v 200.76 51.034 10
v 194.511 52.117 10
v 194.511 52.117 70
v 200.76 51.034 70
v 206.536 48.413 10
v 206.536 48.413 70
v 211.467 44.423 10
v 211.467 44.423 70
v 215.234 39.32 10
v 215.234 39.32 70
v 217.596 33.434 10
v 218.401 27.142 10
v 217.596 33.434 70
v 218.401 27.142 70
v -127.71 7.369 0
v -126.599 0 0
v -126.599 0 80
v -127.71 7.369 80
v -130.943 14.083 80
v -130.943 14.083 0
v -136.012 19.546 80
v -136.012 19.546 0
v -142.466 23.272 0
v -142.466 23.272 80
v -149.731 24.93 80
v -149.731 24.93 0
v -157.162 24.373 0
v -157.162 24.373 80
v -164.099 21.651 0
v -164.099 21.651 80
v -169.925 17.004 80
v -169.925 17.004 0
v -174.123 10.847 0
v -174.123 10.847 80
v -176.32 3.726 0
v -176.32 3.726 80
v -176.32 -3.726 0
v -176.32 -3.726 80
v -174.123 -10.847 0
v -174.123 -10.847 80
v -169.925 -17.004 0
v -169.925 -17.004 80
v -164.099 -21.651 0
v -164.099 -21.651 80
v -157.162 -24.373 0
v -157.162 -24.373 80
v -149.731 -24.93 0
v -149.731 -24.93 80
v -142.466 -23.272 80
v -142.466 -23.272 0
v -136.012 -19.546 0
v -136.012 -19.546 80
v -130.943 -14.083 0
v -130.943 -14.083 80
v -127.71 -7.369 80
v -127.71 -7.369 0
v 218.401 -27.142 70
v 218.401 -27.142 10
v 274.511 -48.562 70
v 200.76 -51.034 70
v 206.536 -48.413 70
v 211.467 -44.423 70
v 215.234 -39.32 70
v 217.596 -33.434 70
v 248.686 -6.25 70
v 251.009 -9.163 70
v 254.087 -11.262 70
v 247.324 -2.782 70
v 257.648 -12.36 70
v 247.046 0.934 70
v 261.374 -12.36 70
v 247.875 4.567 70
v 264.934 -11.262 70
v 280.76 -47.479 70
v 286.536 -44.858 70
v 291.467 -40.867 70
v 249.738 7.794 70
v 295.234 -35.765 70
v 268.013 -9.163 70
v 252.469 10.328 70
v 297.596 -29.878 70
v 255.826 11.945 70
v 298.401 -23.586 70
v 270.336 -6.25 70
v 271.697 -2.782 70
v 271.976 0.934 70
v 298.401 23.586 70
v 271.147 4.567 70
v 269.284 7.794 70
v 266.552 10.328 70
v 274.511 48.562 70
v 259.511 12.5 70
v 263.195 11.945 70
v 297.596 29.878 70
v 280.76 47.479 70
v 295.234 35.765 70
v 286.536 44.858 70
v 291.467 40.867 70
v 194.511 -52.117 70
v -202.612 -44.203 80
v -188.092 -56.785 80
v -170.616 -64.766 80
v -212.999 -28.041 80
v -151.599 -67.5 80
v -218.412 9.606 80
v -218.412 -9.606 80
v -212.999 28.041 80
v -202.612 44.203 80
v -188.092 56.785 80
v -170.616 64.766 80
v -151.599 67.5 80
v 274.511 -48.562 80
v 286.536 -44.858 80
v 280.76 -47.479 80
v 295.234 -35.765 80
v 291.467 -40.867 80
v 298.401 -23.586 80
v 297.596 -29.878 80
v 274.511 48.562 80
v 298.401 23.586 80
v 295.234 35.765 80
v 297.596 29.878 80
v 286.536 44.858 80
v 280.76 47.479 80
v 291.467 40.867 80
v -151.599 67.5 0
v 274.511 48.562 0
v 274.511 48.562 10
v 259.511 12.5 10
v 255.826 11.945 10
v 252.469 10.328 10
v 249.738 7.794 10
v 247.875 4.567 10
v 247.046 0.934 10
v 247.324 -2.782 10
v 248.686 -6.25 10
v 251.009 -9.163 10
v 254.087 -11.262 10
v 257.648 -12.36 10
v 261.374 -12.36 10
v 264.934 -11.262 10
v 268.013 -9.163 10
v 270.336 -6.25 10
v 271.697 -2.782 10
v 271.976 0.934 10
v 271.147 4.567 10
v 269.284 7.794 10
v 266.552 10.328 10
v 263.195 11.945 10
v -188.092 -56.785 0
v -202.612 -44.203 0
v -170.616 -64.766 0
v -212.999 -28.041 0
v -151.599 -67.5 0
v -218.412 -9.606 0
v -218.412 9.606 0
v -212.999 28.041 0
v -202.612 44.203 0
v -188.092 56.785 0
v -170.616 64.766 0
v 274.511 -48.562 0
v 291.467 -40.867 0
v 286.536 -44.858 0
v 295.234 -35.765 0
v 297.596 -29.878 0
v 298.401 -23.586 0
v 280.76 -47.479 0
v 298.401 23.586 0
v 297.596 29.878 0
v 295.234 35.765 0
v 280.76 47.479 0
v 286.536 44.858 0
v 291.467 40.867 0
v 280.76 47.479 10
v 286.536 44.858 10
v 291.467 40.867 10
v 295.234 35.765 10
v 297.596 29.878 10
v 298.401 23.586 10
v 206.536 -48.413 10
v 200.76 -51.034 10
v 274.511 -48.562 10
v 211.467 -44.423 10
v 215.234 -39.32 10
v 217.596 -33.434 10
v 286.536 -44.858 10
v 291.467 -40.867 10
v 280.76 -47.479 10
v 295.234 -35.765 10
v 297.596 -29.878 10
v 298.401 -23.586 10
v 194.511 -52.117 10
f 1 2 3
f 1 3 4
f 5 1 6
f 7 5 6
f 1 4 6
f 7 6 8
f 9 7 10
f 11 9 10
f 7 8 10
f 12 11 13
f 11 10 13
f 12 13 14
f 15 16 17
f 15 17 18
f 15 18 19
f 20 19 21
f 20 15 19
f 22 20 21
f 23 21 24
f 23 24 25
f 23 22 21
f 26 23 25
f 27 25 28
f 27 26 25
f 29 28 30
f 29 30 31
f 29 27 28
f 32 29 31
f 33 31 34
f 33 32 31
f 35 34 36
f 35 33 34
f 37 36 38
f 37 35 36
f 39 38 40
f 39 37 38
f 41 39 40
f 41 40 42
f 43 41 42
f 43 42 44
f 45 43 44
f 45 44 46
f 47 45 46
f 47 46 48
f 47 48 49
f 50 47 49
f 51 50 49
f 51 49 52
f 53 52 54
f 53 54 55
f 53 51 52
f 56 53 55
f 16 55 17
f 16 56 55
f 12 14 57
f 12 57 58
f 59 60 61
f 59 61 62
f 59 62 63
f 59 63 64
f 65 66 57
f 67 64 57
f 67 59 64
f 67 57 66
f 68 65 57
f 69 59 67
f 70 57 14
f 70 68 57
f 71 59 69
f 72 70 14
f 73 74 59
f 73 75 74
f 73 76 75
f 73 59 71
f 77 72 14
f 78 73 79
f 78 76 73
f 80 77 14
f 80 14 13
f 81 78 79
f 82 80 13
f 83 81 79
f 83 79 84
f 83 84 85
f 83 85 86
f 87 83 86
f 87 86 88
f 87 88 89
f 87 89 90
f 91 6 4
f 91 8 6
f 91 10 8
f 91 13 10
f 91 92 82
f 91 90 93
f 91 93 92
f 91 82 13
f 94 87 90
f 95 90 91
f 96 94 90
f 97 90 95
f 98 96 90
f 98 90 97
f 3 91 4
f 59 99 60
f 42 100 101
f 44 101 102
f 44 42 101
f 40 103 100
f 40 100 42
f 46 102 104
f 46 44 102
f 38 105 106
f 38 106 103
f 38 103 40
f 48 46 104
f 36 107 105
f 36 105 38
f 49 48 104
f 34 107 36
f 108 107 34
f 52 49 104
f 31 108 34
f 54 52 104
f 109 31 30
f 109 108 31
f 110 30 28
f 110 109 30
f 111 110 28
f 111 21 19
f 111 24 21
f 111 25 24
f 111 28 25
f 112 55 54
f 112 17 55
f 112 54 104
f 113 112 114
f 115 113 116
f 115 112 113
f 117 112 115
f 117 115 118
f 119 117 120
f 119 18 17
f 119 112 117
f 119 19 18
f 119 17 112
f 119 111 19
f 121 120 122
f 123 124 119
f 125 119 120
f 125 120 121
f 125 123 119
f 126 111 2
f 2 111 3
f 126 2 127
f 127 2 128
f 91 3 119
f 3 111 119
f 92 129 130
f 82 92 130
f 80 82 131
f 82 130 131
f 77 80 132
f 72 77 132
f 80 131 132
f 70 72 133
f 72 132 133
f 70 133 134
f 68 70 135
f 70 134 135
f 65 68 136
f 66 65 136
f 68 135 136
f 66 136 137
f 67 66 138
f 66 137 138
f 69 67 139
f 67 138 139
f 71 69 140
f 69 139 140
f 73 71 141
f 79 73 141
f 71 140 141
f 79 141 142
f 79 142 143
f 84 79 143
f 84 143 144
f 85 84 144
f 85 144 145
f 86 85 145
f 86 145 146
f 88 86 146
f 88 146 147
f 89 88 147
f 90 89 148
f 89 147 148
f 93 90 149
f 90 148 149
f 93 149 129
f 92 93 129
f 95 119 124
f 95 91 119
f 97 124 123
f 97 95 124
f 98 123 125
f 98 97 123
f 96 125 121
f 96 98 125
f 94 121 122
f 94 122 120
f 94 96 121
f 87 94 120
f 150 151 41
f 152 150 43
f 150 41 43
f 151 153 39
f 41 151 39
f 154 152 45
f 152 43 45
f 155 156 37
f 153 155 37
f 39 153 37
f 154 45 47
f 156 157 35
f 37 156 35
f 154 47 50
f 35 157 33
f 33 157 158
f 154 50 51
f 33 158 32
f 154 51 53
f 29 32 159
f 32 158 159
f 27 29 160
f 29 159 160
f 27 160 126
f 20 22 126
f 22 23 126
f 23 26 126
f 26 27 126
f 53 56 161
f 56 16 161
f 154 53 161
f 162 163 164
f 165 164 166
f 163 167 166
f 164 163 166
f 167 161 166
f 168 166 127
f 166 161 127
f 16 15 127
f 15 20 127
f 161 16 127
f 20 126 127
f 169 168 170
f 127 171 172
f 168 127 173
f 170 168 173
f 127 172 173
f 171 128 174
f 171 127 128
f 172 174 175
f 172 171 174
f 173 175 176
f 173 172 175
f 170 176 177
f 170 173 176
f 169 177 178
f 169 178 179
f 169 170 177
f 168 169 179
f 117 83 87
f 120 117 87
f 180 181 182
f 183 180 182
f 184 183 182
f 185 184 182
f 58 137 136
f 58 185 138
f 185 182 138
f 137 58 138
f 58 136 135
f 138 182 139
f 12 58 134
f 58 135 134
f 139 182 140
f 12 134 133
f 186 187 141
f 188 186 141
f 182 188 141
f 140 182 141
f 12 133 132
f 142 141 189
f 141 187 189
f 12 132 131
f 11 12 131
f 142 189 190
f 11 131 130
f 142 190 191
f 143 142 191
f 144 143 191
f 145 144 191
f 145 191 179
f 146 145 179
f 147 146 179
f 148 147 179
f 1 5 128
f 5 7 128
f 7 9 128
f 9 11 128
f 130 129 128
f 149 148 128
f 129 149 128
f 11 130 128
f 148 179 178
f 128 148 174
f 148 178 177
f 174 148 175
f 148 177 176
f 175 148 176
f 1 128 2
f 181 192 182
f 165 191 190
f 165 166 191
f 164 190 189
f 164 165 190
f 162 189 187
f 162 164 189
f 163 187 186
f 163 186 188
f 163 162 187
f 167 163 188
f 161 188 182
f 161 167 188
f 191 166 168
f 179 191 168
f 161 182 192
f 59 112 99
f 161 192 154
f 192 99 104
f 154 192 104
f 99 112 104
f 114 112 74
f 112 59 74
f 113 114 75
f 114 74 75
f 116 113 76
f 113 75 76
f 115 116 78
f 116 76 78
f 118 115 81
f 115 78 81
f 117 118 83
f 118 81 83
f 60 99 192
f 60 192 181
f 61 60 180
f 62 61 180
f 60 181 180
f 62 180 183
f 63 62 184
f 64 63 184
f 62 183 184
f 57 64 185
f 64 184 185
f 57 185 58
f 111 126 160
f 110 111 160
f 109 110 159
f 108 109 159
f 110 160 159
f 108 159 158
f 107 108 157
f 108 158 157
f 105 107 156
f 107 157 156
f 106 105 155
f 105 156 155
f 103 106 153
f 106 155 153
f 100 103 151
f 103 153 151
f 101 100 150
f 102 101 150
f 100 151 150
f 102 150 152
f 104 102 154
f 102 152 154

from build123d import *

# Parameters (mm, degrees)
SKETCH1_R           = 25
BOSS_EXTRUDE1_DEPTH = 80
CUT_EXTRUDE1_DEPTH  = 80
SKETCH4_W           = 60
SKETCH4_H           = 145
CUT_EXTRUDE2_DEPTH  = 80
FILLET1_R           = 25
FILLET2_R           = 25
SKETCH5_R           = 12.5
BOSS_EXTRUDE2_DEPTH = 60


with BuildPart() as part:
    # Sketch1 → Boss-Extrude1 (new body)
    with BuildSketch(Plane.XY):
        with BuildLine():
            Line((-151.599161153, -67.5), (298.400838847, -67.5))
            Line((298.400838847, -67.5), (298.400838847, 67.5))
            Line((298.400838847, 67.5), (-151.599161153, 67.5))
            ThreePointArc((-151.599161153, 67.5), (-219.099161153, 0), (-151.599161153, -67.5))
        make_face()
        with Locations((-151.599161153, 0)):
            Circle(SKETCH1_R, mode=Mode.SUBTRACT)
    extrude(amount=BOSS_EXTRUDE1_DEPTH)

    # Sketch3 → Cut-Extrude1 (cut)
    with BuildSketch(Plane.XY.offset(80)):
        Polygon((298.400838847, 67.5), (-151.599161153, 67.5), (298.400838847, 47.5), align=None)
        Polygon((298.400838847, -67.5), (298.400838847, -47.5), (-151.599161153, -67.5), align=None)
    extrude(amount=-CUT_EXTRUDE1_DEPTH, mode=Mode.SUBTRACT)

    # Sketch4 → Cut-Extrude2 (cut)
    with BuildSketch(Plane(origin=(298.400838847, 0, 0), x_dir=(0, 0, -1), z_dir=(1, 0, 0))):
        with Locations((-40, 0)):
            Rectangle(SKETCH4_W, SKETCH4_H)
    extrude(amount=-CUT_EXTRUDE2_DEPTH, mode=Mode.SUBTRACT)

    # Fillet1
    fillet1_edges = [part.edges().sort_by_distance(p)[0] for p in [
        (218.400838847, -51.055555556, 40),
        (218.400838847, 51.055555556, 40),
    ]]
    fillet(fillet1_edges, radius=FILLET1_R)

    # Fillet2
    fillet2_edges = [part.edges().sort_by_distance(p)[0] for p in [
        (298.400838847, 47.5, 5),
        (298.400838847, -47.5, 5),
        (298.400838847, -47.5, 75),
        (298.400838847, 47.5, 75),
    ]]
    fillet(fillet2_edges, radius=FILLET2_R)

    # Sketch5 → Boss-Extrude2 (add)
    with BuildSketch(Plane.XY.offset(10)):
        with Locations(Location((259.510854188, 0, 0), (0, 0, 90))):
            Circle(SKETCH5_R)
    extrude(amount=BOSS_EXTRUDE2_DEPTH)


solid = part.part
